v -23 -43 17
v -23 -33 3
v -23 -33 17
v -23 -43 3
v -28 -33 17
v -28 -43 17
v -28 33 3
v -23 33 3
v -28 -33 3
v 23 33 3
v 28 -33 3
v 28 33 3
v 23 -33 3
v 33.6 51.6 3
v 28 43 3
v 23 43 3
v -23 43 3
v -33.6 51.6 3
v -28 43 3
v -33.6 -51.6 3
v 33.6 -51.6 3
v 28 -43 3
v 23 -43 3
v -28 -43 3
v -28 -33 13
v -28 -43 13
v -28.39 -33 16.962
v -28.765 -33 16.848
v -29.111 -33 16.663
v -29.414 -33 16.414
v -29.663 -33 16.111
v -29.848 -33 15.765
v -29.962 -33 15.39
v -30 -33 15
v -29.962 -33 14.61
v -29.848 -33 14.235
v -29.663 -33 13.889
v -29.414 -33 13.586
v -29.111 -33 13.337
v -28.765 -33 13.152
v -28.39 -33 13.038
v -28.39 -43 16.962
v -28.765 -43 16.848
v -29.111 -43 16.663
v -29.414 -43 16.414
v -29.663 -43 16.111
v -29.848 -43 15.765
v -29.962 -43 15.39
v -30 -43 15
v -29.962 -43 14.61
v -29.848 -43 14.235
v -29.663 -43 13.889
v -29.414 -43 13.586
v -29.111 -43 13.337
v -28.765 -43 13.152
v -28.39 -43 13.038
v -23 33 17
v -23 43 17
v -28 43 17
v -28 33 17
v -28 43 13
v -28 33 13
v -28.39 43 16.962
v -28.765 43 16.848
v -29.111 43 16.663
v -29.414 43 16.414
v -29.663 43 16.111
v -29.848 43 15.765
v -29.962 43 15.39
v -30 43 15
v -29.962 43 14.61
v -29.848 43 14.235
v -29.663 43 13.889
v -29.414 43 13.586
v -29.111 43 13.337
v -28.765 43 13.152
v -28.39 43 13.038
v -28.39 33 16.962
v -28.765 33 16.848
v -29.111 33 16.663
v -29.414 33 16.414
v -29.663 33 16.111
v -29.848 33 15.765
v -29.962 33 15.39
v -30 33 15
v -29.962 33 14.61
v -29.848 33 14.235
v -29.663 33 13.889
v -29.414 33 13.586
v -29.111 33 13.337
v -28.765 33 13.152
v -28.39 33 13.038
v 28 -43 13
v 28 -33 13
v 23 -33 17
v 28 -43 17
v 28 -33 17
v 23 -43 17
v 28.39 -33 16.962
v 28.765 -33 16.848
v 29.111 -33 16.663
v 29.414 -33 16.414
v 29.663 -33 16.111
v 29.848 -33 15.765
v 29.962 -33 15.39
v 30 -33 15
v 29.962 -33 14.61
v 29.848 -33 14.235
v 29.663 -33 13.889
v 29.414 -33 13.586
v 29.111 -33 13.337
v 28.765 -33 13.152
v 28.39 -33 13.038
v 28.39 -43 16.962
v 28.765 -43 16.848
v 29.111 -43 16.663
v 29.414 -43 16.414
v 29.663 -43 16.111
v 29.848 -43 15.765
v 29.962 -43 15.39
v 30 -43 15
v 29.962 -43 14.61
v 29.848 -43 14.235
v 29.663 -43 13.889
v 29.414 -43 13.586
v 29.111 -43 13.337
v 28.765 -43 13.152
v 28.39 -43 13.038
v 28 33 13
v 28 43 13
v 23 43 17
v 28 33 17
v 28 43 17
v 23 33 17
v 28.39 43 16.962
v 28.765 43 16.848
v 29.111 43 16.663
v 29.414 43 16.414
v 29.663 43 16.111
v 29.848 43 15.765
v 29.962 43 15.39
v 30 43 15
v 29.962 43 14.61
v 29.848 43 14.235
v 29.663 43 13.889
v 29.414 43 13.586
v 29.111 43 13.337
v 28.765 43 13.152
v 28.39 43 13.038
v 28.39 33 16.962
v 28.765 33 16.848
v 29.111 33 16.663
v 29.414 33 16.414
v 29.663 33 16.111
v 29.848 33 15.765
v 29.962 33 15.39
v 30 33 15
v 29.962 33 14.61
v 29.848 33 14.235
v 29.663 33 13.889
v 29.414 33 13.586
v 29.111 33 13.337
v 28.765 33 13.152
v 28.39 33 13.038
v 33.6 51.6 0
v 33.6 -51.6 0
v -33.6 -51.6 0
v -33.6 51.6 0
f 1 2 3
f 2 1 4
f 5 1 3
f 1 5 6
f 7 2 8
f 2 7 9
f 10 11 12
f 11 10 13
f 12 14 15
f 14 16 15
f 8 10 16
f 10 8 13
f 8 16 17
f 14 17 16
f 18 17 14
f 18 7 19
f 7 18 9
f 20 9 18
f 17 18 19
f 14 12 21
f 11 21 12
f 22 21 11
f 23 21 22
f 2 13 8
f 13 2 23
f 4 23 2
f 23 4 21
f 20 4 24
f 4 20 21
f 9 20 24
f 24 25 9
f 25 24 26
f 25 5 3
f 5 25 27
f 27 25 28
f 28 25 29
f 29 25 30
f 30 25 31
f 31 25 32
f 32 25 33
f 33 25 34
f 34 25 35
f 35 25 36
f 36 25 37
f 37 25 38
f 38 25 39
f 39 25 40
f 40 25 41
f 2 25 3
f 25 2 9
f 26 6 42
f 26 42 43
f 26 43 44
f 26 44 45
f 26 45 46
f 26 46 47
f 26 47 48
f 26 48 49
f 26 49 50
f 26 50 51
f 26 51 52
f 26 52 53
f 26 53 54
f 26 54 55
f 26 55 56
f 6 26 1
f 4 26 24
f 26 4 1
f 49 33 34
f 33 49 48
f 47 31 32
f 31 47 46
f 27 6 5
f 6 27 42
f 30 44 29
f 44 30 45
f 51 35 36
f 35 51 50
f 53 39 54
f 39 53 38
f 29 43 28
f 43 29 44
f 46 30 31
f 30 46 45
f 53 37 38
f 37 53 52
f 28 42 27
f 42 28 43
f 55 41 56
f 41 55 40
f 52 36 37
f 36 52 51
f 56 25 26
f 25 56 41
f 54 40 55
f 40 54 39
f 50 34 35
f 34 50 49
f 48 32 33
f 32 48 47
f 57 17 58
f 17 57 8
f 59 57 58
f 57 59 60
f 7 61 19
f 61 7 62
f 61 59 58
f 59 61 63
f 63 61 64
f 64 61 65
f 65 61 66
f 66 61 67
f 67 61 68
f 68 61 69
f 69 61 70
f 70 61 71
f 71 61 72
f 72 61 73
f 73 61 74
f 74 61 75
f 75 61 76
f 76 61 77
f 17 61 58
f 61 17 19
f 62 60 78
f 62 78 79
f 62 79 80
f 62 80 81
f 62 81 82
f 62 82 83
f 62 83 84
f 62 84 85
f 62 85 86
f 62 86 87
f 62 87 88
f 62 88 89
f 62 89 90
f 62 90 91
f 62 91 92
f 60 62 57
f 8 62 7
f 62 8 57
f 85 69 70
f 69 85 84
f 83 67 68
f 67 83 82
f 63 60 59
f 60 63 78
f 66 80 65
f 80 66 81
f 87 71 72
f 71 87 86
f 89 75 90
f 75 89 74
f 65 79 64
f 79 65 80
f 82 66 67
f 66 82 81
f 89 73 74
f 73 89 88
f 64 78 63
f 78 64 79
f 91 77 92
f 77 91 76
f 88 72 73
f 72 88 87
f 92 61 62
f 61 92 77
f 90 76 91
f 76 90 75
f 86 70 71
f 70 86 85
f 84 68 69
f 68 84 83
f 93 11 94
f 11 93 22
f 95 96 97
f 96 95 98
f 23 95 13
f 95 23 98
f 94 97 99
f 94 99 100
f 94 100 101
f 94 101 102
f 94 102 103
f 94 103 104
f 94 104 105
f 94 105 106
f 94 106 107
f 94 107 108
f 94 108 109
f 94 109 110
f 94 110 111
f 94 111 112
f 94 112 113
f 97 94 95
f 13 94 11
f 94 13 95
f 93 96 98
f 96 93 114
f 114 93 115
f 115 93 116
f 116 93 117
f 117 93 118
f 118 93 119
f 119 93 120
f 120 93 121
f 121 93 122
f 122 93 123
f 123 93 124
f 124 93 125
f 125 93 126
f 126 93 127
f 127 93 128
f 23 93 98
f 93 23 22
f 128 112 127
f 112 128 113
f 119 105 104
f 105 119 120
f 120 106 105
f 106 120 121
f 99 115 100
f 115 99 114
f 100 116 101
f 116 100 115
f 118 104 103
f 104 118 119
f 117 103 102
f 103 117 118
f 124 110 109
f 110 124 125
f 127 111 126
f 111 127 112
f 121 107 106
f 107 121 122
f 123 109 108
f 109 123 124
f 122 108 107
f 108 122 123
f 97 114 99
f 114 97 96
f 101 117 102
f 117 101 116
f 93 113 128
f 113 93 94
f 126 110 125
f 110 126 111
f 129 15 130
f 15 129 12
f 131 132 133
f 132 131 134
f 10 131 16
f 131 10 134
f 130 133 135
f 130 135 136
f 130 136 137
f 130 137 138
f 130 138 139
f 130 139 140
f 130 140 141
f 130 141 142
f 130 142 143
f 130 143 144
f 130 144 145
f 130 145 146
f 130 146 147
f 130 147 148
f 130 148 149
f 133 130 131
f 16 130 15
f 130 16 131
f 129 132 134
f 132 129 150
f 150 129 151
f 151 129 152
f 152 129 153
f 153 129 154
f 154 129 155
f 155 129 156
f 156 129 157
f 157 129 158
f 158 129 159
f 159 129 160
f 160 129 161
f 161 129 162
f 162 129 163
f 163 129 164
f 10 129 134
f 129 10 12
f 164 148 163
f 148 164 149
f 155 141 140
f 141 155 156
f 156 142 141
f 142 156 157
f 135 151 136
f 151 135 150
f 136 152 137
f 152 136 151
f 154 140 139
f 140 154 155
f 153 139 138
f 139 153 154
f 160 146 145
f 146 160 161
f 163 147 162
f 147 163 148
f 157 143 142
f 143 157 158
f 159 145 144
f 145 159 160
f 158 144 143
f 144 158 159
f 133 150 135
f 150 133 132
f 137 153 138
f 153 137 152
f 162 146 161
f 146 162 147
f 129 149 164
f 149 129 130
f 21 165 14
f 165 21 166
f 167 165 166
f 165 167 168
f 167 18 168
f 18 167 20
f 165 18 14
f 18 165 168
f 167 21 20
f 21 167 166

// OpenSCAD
// file: BOSL2/std.scad
// Minimal BOSL2 compatibility shim for bundled gallery models.
// It implements only the helpers used by the imported OpenSCAD projects.

CENTER = [0, 0, 0];
BOTTOM = [0, 0, -1];
TOP = [0, 0, 1];
LEFT = [-1, 0, 0];
RIGHT = [1, 0, 0];
FRONT = [0, -1, 0];
BACK = [0, 1, 0];

module up(z=0) {
    translate([0, 0, z]) children();
}

module down(z=0) {
    translate([0, 0, -z]) children();
}

module attach(anchor=CENTER) {
    children();
}

module cuboid(size=[1, 1, 1], anchor=CENTER) {
    center = anchor == CENTER;
    translate(center ? [0, 0, 0] : [0, 0, size[2] / 2])
        cube(size, center=true);
    children();
}

module xcyl(h=1, r=1, anchor=CENTER) {
    center = anchor == CENTER;
    translate(center ? [0, 0, 0] : [h / 2, 0, 0])
        rotate([0, 90, 0])
            cylinder(h=h, r=r, center=true);
}
// main file
//
// Blank wall plate for the removed outlet in the back of the oven.
//
// Opening of 56x86x10mm
//

// The Belfry OpenScad Library, v2:  https://github.com/BelfrySCAD/BOSL2
include <BOSL2/std.scad>

// *** Model Parameters ***
/* [Model Parameters] */

// Width of the opening that is being covered.
opening_width = 56;

// Height of the opening that is being covered.
opening_height = 86;

// Depth of the opening.  This is used to make the snap-in tabs.
opening_depth = 10;

// Thickness of the wall plate.
plate_thickness = 3;

// Snap in tab width.  This is the width of the tabs that will snap into the opening.
tab_width = 10;

// Snap in tab depth.  This is the depth of the tabs that will snap into the opening.
tab_thickness = 5; 

// The external size of the wall plate driven by the opening size.  
//1.2 = 120% of the opening.
plate_size_pct = 1.20;

// Tab Nub Diameter
nub_diameter = 4;


// *** "Private" variables ***
/* [Hidden] */

// OpenSCAD System Settings
$fa = 1;
$fs = 0.4;

// Calculated Global Vars

// Snap in height is the depth of the opening plus a nub to hold in the plate.
tab_height = opening_depth + nub_diameter;

// Overlap tolerance so that there are no gaps between objects.


//
// Creates the wall plate.
//
module wall_plate () {
    plate_width = opening_width * plate_size_pct;
    plate_height = opening_height * plate_size_pct;

    corner_rounding = 1;

    cuboid([plate_width, plate_height, plate_thickness],
            rounding=corner_rounding, except=[TOP], anchor=BOTTOM);
}

//
// Tabs for snapping the wall plate into the opening.
//
module snap_in_tabs() {
    plate_width = opening_width * plate_size_pct;
    plate_height = opening_height * plate_size_pct;

    // Calculate offsets to place tabs at the four corners of the opening
    x_offsets = [
        -opening_width/2 + tab_thickness/2,
        opening_width/2 - tab_thickness/2
    ];
    y_offsets = [
        -opening_height/2 + tab_width/2,
        opening_height/2 - tab_width/2
    ];

    // Place tabs at each corner, with their bottom at the top of the wall plate
    for (x = x_offsets, y = y_offsets) {
        echo(str("Placing tab at: ", x, ", ", y));
        color("red")
            translate([x, y, plate_thickness])
                cuboid([tab_thickness, tab_width, tab_height], anchor=BOTTOM);

        // Add a nub to help hold the tab in place
        if (x < 0) {
            nub_x = x - tab_thickness/2;
            translate([nub_x, y + tab_width/2, plate_thickness + tab_height - (nub_diameter / 2)])
            {
                rotate([90, 0, 0])
                    cylinder(d=nub_diameter, h=tab_width, anchor=BOTTOM);
            }

        } else {
            nub_x = x + tab_thickness/2;
            translate([nub_x, y + tab_width/2, plate_thickness + tab_height - (nub_diameter / 2)])
            {
                rotate([90, 0, 0])
                    cylinder(d=nub_diameter, h=tab_width, anchor=BOTTOM);
            }
        }
        // translate([nub_x, y + tab_width/2, plate_thickness + tab_height - (nub_diameter / 2)])
        // {
        //     rotate([90, 0, 0])
        //         cylinder(d=nub_diameter, h=tab_width, anchor=BOTTOM);
        // }

    }
}


// 
// Main module that creates the model.
//
module build_model() {
    // Create the wall plate
    wall_plate();

    // Add in the snap-in tabs
    snap_in_tabs();

}

build_model();
